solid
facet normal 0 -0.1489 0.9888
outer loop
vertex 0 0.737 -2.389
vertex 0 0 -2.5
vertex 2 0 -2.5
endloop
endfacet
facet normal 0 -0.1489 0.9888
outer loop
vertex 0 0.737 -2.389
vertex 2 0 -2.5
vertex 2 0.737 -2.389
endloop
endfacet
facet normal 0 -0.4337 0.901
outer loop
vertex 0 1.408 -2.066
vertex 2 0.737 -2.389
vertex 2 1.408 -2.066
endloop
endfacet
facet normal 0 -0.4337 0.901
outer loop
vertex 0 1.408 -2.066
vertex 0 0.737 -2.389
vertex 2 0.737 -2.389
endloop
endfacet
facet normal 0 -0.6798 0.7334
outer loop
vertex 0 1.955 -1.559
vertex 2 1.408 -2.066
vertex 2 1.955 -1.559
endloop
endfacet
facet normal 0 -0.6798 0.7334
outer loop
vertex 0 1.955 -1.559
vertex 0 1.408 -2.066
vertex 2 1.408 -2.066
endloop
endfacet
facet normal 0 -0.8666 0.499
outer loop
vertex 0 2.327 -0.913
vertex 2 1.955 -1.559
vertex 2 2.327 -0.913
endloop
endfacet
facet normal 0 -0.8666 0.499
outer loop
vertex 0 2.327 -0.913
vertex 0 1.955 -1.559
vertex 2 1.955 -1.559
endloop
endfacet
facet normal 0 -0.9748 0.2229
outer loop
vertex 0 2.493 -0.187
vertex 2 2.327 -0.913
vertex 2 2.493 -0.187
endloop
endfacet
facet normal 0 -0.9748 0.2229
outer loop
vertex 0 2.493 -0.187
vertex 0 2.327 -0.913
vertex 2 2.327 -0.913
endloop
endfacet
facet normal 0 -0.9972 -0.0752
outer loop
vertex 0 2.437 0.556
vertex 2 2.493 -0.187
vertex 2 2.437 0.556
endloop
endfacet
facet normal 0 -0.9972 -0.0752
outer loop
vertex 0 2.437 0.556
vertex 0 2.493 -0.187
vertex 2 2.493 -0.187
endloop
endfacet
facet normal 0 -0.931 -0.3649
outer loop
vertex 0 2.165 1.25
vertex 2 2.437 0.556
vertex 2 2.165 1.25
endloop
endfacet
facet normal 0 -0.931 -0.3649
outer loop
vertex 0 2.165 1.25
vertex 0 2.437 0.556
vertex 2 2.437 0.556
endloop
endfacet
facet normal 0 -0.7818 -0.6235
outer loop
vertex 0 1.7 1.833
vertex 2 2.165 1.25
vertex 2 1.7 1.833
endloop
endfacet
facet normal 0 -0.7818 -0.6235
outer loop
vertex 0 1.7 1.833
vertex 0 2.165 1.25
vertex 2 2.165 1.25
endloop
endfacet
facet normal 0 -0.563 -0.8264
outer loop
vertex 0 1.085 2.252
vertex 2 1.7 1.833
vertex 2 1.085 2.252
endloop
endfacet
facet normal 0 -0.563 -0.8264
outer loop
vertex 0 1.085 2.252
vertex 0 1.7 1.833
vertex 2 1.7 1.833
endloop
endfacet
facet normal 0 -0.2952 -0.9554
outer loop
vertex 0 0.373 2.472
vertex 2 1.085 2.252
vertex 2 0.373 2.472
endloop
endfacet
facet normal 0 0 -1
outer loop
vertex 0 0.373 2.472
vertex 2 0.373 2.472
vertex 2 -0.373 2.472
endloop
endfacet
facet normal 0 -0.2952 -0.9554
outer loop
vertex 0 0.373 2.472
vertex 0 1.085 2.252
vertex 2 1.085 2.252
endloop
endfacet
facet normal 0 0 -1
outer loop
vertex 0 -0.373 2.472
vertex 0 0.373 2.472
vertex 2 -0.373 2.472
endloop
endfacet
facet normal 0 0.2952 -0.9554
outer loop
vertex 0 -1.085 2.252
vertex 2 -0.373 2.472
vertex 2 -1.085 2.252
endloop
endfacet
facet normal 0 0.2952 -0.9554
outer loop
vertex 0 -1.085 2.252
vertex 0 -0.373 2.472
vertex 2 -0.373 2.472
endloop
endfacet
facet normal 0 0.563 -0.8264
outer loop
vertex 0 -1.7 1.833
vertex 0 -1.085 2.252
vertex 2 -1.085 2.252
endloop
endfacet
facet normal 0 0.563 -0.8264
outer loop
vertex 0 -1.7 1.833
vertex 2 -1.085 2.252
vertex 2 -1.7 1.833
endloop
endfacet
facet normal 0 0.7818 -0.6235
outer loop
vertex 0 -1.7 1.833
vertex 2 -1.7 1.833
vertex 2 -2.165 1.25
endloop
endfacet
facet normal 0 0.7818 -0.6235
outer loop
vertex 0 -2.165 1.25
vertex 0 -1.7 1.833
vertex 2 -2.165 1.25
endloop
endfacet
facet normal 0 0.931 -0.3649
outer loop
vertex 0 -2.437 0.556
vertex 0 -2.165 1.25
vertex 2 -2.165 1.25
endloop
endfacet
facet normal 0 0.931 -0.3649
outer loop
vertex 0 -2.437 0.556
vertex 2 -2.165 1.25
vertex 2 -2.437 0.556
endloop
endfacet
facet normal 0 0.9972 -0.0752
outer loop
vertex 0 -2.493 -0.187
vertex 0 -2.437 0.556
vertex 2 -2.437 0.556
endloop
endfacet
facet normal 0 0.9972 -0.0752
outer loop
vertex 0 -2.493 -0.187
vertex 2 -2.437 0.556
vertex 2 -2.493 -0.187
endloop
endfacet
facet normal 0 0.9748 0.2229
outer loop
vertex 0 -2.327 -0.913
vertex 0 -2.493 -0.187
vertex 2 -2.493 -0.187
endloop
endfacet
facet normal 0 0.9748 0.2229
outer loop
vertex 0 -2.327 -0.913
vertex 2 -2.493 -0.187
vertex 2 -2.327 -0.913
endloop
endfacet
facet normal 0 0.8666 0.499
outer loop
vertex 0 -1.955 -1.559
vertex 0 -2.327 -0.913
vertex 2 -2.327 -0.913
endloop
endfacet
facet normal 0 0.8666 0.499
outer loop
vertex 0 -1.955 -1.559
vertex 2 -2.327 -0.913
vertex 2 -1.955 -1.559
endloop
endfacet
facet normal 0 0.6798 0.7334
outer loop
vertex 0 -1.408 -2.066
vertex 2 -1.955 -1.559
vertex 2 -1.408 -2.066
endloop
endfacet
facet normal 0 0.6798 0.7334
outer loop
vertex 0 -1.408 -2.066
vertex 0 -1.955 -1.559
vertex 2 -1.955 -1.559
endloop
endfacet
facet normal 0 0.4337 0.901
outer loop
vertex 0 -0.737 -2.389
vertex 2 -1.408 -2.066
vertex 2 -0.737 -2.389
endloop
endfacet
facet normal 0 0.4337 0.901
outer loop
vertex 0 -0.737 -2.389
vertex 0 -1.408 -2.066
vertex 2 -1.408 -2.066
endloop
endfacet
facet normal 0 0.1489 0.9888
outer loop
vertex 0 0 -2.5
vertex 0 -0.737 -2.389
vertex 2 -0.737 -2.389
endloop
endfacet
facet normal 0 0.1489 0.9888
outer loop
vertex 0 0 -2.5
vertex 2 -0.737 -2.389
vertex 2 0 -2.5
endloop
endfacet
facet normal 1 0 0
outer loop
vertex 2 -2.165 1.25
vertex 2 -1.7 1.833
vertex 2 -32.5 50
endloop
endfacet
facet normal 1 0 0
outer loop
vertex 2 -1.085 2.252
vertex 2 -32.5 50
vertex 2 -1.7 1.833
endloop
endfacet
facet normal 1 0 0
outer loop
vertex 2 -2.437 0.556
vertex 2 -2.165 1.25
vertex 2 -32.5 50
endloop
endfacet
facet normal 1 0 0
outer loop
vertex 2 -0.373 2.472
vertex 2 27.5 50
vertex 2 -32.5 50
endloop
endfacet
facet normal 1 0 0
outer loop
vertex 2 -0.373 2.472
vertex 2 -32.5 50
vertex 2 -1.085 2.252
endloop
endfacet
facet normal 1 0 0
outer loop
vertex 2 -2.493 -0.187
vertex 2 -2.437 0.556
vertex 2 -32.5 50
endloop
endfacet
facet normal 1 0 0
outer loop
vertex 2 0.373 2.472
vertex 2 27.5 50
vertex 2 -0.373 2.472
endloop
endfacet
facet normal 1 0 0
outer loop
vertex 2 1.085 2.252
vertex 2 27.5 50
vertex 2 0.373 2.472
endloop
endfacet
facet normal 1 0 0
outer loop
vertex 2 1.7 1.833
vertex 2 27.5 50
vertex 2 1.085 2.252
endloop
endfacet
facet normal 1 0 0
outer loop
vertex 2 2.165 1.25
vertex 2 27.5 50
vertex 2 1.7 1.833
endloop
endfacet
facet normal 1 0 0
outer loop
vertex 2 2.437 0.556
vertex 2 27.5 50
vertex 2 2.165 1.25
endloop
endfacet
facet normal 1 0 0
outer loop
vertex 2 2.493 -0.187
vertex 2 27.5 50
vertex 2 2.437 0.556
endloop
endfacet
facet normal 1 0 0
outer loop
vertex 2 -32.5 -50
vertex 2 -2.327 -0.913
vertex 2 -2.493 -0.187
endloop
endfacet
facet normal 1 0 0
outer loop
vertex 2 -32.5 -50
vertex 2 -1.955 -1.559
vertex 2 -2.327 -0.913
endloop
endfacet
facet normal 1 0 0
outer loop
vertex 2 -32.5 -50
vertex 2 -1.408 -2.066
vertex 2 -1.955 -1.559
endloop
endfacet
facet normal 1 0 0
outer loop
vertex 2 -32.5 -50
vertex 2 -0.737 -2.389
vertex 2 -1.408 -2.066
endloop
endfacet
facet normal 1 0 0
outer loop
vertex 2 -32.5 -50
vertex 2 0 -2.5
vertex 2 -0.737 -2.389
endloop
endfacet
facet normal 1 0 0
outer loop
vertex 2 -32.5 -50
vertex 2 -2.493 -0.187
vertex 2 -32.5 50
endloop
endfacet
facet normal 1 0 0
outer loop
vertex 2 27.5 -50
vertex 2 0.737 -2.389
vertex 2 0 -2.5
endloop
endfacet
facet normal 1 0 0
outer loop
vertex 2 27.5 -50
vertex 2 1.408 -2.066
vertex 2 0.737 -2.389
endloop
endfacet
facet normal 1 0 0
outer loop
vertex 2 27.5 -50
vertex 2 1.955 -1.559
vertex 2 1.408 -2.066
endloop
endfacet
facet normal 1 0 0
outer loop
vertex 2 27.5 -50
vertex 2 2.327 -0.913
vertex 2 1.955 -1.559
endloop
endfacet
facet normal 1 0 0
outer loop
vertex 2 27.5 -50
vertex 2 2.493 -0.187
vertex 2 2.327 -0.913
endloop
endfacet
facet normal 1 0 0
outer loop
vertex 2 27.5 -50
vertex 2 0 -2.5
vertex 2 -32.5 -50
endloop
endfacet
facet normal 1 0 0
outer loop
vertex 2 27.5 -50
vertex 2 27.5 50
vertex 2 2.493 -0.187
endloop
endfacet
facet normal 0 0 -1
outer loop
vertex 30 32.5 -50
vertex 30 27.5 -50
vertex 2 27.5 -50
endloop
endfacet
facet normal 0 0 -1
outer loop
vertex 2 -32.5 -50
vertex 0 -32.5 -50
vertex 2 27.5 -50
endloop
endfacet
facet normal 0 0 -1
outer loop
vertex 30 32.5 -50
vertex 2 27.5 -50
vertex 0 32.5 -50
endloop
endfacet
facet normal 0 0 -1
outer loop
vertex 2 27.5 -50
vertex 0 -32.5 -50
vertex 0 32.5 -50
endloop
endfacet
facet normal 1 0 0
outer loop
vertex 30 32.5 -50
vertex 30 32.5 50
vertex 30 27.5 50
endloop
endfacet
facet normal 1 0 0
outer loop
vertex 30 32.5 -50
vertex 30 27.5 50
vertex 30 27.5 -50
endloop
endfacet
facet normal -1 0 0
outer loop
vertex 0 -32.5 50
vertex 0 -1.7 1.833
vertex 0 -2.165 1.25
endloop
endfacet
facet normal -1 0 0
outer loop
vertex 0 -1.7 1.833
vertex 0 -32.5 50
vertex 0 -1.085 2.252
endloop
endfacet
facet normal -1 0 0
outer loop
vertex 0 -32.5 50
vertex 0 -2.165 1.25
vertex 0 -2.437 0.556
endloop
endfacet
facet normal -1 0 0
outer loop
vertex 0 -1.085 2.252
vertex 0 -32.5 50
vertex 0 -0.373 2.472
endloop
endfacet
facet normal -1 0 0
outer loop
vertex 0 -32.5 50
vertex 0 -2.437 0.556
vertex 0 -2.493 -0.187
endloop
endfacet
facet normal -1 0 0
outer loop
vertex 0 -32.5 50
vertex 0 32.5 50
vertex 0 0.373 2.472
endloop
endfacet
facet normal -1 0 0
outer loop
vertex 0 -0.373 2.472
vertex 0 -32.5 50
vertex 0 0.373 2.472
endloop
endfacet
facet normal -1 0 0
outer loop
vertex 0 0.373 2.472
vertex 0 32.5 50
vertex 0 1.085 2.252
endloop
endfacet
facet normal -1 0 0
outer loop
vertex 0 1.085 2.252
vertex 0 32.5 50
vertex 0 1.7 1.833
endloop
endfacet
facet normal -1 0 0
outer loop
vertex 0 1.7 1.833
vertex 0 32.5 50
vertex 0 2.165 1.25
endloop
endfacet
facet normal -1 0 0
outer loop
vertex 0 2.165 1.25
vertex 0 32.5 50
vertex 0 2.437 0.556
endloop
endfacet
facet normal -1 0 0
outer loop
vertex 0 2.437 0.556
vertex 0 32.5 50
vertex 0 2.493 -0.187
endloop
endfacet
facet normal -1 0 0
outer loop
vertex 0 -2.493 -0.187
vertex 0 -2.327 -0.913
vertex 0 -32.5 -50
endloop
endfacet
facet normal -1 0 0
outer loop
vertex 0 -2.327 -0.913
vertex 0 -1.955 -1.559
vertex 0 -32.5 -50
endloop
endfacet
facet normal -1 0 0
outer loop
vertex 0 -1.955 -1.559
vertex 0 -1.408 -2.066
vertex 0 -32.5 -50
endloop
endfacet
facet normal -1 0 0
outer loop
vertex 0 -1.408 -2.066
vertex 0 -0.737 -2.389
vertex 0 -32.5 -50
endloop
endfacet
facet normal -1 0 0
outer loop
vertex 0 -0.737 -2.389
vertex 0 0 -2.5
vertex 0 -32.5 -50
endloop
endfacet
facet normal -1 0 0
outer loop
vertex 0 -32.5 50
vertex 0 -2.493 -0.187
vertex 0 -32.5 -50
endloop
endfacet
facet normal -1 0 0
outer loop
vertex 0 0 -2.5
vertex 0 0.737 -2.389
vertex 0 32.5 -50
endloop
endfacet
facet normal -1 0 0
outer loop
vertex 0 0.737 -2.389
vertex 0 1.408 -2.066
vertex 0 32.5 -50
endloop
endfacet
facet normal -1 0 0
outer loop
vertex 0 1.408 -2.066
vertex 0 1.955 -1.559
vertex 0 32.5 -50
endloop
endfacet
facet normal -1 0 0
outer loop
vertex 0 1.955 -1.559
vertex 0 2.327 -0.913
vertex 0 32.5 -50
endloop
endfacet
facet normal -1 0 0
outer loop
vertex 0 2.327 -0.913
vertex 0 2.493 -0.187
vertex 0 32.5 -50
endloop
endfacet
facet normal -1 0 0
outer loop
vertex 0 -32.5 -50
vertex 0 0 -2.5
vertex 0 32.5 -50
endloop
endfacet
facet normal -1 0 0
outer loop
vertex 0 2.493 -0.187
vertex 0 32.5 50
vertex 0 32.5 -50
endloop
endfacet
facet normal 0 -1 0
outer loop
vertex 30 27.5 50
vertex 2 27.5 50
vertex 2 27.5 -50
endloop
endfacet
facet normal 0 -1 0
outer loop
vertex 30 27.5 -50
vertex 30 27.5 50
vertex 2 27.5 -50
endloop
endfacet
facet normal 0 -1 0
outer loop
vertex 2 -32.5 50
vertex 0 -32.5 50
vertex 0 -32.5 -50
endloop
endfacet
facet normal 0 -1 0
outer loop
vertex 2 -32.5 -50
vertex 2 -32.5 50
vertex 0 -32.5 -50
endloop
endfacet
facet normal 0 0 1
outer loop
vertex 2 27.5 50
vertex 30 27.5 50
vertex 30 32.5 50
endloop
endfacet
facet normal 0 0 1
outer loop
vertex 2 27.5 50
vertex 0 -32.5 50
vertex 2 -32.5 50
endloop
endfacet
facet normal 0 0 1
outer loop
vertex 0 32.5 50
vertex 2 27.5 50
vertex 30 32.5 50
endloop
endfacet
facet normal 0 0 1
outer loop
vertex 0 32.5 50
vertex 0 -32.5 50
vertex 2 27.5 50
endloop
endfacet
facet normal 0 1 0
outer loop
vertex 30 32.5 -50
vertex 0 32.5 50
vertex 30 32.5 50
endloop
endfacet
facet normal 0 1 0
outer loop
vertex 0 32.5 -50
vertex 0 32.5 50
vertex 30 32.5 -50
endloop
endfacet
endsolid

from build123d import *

# Parameters (mm, degrees)
SKETCH1_W           = 100
SKETCH1_H           = 65
SKETCH1_R           = 2.5
BOSS_EXTRUDE1_DEPTH = 2
SKETCH2_W           = 100
SKETCH2_H           = 5
BOSS_EXTRUDE2_DEPTH = 28


with BuildPart() as part:
    # Sketch1 → Boss-Extrude1 (new body)
    with BuildSketch(Plane(origin=(0, 0, 0), x_dir=(0, 0, -1), z_dir=(1, 0, 0))):
        Rectangle(SKETCH1_W, SKETCH1_H)
        Circle(SKETCH1_R, mode=Mode.SUBTRACT)
    extrude(amount=BOSS_EXTRUDE1_DEPTH)

    # Sketch2 → Boss-Extrude2 (add)
    with BuildSketch(Plane(origin=(2, 0, 0), x_dir=(0, 0, -1), z_dir=(1, 0, 0))):
        with Locations((0, 30)):
            Rectangle(SKETCH2_W, SKETCH2_H)
    extrude(amount=BOSS_EXTRUDE2_DEPTH)


solid = part.part
